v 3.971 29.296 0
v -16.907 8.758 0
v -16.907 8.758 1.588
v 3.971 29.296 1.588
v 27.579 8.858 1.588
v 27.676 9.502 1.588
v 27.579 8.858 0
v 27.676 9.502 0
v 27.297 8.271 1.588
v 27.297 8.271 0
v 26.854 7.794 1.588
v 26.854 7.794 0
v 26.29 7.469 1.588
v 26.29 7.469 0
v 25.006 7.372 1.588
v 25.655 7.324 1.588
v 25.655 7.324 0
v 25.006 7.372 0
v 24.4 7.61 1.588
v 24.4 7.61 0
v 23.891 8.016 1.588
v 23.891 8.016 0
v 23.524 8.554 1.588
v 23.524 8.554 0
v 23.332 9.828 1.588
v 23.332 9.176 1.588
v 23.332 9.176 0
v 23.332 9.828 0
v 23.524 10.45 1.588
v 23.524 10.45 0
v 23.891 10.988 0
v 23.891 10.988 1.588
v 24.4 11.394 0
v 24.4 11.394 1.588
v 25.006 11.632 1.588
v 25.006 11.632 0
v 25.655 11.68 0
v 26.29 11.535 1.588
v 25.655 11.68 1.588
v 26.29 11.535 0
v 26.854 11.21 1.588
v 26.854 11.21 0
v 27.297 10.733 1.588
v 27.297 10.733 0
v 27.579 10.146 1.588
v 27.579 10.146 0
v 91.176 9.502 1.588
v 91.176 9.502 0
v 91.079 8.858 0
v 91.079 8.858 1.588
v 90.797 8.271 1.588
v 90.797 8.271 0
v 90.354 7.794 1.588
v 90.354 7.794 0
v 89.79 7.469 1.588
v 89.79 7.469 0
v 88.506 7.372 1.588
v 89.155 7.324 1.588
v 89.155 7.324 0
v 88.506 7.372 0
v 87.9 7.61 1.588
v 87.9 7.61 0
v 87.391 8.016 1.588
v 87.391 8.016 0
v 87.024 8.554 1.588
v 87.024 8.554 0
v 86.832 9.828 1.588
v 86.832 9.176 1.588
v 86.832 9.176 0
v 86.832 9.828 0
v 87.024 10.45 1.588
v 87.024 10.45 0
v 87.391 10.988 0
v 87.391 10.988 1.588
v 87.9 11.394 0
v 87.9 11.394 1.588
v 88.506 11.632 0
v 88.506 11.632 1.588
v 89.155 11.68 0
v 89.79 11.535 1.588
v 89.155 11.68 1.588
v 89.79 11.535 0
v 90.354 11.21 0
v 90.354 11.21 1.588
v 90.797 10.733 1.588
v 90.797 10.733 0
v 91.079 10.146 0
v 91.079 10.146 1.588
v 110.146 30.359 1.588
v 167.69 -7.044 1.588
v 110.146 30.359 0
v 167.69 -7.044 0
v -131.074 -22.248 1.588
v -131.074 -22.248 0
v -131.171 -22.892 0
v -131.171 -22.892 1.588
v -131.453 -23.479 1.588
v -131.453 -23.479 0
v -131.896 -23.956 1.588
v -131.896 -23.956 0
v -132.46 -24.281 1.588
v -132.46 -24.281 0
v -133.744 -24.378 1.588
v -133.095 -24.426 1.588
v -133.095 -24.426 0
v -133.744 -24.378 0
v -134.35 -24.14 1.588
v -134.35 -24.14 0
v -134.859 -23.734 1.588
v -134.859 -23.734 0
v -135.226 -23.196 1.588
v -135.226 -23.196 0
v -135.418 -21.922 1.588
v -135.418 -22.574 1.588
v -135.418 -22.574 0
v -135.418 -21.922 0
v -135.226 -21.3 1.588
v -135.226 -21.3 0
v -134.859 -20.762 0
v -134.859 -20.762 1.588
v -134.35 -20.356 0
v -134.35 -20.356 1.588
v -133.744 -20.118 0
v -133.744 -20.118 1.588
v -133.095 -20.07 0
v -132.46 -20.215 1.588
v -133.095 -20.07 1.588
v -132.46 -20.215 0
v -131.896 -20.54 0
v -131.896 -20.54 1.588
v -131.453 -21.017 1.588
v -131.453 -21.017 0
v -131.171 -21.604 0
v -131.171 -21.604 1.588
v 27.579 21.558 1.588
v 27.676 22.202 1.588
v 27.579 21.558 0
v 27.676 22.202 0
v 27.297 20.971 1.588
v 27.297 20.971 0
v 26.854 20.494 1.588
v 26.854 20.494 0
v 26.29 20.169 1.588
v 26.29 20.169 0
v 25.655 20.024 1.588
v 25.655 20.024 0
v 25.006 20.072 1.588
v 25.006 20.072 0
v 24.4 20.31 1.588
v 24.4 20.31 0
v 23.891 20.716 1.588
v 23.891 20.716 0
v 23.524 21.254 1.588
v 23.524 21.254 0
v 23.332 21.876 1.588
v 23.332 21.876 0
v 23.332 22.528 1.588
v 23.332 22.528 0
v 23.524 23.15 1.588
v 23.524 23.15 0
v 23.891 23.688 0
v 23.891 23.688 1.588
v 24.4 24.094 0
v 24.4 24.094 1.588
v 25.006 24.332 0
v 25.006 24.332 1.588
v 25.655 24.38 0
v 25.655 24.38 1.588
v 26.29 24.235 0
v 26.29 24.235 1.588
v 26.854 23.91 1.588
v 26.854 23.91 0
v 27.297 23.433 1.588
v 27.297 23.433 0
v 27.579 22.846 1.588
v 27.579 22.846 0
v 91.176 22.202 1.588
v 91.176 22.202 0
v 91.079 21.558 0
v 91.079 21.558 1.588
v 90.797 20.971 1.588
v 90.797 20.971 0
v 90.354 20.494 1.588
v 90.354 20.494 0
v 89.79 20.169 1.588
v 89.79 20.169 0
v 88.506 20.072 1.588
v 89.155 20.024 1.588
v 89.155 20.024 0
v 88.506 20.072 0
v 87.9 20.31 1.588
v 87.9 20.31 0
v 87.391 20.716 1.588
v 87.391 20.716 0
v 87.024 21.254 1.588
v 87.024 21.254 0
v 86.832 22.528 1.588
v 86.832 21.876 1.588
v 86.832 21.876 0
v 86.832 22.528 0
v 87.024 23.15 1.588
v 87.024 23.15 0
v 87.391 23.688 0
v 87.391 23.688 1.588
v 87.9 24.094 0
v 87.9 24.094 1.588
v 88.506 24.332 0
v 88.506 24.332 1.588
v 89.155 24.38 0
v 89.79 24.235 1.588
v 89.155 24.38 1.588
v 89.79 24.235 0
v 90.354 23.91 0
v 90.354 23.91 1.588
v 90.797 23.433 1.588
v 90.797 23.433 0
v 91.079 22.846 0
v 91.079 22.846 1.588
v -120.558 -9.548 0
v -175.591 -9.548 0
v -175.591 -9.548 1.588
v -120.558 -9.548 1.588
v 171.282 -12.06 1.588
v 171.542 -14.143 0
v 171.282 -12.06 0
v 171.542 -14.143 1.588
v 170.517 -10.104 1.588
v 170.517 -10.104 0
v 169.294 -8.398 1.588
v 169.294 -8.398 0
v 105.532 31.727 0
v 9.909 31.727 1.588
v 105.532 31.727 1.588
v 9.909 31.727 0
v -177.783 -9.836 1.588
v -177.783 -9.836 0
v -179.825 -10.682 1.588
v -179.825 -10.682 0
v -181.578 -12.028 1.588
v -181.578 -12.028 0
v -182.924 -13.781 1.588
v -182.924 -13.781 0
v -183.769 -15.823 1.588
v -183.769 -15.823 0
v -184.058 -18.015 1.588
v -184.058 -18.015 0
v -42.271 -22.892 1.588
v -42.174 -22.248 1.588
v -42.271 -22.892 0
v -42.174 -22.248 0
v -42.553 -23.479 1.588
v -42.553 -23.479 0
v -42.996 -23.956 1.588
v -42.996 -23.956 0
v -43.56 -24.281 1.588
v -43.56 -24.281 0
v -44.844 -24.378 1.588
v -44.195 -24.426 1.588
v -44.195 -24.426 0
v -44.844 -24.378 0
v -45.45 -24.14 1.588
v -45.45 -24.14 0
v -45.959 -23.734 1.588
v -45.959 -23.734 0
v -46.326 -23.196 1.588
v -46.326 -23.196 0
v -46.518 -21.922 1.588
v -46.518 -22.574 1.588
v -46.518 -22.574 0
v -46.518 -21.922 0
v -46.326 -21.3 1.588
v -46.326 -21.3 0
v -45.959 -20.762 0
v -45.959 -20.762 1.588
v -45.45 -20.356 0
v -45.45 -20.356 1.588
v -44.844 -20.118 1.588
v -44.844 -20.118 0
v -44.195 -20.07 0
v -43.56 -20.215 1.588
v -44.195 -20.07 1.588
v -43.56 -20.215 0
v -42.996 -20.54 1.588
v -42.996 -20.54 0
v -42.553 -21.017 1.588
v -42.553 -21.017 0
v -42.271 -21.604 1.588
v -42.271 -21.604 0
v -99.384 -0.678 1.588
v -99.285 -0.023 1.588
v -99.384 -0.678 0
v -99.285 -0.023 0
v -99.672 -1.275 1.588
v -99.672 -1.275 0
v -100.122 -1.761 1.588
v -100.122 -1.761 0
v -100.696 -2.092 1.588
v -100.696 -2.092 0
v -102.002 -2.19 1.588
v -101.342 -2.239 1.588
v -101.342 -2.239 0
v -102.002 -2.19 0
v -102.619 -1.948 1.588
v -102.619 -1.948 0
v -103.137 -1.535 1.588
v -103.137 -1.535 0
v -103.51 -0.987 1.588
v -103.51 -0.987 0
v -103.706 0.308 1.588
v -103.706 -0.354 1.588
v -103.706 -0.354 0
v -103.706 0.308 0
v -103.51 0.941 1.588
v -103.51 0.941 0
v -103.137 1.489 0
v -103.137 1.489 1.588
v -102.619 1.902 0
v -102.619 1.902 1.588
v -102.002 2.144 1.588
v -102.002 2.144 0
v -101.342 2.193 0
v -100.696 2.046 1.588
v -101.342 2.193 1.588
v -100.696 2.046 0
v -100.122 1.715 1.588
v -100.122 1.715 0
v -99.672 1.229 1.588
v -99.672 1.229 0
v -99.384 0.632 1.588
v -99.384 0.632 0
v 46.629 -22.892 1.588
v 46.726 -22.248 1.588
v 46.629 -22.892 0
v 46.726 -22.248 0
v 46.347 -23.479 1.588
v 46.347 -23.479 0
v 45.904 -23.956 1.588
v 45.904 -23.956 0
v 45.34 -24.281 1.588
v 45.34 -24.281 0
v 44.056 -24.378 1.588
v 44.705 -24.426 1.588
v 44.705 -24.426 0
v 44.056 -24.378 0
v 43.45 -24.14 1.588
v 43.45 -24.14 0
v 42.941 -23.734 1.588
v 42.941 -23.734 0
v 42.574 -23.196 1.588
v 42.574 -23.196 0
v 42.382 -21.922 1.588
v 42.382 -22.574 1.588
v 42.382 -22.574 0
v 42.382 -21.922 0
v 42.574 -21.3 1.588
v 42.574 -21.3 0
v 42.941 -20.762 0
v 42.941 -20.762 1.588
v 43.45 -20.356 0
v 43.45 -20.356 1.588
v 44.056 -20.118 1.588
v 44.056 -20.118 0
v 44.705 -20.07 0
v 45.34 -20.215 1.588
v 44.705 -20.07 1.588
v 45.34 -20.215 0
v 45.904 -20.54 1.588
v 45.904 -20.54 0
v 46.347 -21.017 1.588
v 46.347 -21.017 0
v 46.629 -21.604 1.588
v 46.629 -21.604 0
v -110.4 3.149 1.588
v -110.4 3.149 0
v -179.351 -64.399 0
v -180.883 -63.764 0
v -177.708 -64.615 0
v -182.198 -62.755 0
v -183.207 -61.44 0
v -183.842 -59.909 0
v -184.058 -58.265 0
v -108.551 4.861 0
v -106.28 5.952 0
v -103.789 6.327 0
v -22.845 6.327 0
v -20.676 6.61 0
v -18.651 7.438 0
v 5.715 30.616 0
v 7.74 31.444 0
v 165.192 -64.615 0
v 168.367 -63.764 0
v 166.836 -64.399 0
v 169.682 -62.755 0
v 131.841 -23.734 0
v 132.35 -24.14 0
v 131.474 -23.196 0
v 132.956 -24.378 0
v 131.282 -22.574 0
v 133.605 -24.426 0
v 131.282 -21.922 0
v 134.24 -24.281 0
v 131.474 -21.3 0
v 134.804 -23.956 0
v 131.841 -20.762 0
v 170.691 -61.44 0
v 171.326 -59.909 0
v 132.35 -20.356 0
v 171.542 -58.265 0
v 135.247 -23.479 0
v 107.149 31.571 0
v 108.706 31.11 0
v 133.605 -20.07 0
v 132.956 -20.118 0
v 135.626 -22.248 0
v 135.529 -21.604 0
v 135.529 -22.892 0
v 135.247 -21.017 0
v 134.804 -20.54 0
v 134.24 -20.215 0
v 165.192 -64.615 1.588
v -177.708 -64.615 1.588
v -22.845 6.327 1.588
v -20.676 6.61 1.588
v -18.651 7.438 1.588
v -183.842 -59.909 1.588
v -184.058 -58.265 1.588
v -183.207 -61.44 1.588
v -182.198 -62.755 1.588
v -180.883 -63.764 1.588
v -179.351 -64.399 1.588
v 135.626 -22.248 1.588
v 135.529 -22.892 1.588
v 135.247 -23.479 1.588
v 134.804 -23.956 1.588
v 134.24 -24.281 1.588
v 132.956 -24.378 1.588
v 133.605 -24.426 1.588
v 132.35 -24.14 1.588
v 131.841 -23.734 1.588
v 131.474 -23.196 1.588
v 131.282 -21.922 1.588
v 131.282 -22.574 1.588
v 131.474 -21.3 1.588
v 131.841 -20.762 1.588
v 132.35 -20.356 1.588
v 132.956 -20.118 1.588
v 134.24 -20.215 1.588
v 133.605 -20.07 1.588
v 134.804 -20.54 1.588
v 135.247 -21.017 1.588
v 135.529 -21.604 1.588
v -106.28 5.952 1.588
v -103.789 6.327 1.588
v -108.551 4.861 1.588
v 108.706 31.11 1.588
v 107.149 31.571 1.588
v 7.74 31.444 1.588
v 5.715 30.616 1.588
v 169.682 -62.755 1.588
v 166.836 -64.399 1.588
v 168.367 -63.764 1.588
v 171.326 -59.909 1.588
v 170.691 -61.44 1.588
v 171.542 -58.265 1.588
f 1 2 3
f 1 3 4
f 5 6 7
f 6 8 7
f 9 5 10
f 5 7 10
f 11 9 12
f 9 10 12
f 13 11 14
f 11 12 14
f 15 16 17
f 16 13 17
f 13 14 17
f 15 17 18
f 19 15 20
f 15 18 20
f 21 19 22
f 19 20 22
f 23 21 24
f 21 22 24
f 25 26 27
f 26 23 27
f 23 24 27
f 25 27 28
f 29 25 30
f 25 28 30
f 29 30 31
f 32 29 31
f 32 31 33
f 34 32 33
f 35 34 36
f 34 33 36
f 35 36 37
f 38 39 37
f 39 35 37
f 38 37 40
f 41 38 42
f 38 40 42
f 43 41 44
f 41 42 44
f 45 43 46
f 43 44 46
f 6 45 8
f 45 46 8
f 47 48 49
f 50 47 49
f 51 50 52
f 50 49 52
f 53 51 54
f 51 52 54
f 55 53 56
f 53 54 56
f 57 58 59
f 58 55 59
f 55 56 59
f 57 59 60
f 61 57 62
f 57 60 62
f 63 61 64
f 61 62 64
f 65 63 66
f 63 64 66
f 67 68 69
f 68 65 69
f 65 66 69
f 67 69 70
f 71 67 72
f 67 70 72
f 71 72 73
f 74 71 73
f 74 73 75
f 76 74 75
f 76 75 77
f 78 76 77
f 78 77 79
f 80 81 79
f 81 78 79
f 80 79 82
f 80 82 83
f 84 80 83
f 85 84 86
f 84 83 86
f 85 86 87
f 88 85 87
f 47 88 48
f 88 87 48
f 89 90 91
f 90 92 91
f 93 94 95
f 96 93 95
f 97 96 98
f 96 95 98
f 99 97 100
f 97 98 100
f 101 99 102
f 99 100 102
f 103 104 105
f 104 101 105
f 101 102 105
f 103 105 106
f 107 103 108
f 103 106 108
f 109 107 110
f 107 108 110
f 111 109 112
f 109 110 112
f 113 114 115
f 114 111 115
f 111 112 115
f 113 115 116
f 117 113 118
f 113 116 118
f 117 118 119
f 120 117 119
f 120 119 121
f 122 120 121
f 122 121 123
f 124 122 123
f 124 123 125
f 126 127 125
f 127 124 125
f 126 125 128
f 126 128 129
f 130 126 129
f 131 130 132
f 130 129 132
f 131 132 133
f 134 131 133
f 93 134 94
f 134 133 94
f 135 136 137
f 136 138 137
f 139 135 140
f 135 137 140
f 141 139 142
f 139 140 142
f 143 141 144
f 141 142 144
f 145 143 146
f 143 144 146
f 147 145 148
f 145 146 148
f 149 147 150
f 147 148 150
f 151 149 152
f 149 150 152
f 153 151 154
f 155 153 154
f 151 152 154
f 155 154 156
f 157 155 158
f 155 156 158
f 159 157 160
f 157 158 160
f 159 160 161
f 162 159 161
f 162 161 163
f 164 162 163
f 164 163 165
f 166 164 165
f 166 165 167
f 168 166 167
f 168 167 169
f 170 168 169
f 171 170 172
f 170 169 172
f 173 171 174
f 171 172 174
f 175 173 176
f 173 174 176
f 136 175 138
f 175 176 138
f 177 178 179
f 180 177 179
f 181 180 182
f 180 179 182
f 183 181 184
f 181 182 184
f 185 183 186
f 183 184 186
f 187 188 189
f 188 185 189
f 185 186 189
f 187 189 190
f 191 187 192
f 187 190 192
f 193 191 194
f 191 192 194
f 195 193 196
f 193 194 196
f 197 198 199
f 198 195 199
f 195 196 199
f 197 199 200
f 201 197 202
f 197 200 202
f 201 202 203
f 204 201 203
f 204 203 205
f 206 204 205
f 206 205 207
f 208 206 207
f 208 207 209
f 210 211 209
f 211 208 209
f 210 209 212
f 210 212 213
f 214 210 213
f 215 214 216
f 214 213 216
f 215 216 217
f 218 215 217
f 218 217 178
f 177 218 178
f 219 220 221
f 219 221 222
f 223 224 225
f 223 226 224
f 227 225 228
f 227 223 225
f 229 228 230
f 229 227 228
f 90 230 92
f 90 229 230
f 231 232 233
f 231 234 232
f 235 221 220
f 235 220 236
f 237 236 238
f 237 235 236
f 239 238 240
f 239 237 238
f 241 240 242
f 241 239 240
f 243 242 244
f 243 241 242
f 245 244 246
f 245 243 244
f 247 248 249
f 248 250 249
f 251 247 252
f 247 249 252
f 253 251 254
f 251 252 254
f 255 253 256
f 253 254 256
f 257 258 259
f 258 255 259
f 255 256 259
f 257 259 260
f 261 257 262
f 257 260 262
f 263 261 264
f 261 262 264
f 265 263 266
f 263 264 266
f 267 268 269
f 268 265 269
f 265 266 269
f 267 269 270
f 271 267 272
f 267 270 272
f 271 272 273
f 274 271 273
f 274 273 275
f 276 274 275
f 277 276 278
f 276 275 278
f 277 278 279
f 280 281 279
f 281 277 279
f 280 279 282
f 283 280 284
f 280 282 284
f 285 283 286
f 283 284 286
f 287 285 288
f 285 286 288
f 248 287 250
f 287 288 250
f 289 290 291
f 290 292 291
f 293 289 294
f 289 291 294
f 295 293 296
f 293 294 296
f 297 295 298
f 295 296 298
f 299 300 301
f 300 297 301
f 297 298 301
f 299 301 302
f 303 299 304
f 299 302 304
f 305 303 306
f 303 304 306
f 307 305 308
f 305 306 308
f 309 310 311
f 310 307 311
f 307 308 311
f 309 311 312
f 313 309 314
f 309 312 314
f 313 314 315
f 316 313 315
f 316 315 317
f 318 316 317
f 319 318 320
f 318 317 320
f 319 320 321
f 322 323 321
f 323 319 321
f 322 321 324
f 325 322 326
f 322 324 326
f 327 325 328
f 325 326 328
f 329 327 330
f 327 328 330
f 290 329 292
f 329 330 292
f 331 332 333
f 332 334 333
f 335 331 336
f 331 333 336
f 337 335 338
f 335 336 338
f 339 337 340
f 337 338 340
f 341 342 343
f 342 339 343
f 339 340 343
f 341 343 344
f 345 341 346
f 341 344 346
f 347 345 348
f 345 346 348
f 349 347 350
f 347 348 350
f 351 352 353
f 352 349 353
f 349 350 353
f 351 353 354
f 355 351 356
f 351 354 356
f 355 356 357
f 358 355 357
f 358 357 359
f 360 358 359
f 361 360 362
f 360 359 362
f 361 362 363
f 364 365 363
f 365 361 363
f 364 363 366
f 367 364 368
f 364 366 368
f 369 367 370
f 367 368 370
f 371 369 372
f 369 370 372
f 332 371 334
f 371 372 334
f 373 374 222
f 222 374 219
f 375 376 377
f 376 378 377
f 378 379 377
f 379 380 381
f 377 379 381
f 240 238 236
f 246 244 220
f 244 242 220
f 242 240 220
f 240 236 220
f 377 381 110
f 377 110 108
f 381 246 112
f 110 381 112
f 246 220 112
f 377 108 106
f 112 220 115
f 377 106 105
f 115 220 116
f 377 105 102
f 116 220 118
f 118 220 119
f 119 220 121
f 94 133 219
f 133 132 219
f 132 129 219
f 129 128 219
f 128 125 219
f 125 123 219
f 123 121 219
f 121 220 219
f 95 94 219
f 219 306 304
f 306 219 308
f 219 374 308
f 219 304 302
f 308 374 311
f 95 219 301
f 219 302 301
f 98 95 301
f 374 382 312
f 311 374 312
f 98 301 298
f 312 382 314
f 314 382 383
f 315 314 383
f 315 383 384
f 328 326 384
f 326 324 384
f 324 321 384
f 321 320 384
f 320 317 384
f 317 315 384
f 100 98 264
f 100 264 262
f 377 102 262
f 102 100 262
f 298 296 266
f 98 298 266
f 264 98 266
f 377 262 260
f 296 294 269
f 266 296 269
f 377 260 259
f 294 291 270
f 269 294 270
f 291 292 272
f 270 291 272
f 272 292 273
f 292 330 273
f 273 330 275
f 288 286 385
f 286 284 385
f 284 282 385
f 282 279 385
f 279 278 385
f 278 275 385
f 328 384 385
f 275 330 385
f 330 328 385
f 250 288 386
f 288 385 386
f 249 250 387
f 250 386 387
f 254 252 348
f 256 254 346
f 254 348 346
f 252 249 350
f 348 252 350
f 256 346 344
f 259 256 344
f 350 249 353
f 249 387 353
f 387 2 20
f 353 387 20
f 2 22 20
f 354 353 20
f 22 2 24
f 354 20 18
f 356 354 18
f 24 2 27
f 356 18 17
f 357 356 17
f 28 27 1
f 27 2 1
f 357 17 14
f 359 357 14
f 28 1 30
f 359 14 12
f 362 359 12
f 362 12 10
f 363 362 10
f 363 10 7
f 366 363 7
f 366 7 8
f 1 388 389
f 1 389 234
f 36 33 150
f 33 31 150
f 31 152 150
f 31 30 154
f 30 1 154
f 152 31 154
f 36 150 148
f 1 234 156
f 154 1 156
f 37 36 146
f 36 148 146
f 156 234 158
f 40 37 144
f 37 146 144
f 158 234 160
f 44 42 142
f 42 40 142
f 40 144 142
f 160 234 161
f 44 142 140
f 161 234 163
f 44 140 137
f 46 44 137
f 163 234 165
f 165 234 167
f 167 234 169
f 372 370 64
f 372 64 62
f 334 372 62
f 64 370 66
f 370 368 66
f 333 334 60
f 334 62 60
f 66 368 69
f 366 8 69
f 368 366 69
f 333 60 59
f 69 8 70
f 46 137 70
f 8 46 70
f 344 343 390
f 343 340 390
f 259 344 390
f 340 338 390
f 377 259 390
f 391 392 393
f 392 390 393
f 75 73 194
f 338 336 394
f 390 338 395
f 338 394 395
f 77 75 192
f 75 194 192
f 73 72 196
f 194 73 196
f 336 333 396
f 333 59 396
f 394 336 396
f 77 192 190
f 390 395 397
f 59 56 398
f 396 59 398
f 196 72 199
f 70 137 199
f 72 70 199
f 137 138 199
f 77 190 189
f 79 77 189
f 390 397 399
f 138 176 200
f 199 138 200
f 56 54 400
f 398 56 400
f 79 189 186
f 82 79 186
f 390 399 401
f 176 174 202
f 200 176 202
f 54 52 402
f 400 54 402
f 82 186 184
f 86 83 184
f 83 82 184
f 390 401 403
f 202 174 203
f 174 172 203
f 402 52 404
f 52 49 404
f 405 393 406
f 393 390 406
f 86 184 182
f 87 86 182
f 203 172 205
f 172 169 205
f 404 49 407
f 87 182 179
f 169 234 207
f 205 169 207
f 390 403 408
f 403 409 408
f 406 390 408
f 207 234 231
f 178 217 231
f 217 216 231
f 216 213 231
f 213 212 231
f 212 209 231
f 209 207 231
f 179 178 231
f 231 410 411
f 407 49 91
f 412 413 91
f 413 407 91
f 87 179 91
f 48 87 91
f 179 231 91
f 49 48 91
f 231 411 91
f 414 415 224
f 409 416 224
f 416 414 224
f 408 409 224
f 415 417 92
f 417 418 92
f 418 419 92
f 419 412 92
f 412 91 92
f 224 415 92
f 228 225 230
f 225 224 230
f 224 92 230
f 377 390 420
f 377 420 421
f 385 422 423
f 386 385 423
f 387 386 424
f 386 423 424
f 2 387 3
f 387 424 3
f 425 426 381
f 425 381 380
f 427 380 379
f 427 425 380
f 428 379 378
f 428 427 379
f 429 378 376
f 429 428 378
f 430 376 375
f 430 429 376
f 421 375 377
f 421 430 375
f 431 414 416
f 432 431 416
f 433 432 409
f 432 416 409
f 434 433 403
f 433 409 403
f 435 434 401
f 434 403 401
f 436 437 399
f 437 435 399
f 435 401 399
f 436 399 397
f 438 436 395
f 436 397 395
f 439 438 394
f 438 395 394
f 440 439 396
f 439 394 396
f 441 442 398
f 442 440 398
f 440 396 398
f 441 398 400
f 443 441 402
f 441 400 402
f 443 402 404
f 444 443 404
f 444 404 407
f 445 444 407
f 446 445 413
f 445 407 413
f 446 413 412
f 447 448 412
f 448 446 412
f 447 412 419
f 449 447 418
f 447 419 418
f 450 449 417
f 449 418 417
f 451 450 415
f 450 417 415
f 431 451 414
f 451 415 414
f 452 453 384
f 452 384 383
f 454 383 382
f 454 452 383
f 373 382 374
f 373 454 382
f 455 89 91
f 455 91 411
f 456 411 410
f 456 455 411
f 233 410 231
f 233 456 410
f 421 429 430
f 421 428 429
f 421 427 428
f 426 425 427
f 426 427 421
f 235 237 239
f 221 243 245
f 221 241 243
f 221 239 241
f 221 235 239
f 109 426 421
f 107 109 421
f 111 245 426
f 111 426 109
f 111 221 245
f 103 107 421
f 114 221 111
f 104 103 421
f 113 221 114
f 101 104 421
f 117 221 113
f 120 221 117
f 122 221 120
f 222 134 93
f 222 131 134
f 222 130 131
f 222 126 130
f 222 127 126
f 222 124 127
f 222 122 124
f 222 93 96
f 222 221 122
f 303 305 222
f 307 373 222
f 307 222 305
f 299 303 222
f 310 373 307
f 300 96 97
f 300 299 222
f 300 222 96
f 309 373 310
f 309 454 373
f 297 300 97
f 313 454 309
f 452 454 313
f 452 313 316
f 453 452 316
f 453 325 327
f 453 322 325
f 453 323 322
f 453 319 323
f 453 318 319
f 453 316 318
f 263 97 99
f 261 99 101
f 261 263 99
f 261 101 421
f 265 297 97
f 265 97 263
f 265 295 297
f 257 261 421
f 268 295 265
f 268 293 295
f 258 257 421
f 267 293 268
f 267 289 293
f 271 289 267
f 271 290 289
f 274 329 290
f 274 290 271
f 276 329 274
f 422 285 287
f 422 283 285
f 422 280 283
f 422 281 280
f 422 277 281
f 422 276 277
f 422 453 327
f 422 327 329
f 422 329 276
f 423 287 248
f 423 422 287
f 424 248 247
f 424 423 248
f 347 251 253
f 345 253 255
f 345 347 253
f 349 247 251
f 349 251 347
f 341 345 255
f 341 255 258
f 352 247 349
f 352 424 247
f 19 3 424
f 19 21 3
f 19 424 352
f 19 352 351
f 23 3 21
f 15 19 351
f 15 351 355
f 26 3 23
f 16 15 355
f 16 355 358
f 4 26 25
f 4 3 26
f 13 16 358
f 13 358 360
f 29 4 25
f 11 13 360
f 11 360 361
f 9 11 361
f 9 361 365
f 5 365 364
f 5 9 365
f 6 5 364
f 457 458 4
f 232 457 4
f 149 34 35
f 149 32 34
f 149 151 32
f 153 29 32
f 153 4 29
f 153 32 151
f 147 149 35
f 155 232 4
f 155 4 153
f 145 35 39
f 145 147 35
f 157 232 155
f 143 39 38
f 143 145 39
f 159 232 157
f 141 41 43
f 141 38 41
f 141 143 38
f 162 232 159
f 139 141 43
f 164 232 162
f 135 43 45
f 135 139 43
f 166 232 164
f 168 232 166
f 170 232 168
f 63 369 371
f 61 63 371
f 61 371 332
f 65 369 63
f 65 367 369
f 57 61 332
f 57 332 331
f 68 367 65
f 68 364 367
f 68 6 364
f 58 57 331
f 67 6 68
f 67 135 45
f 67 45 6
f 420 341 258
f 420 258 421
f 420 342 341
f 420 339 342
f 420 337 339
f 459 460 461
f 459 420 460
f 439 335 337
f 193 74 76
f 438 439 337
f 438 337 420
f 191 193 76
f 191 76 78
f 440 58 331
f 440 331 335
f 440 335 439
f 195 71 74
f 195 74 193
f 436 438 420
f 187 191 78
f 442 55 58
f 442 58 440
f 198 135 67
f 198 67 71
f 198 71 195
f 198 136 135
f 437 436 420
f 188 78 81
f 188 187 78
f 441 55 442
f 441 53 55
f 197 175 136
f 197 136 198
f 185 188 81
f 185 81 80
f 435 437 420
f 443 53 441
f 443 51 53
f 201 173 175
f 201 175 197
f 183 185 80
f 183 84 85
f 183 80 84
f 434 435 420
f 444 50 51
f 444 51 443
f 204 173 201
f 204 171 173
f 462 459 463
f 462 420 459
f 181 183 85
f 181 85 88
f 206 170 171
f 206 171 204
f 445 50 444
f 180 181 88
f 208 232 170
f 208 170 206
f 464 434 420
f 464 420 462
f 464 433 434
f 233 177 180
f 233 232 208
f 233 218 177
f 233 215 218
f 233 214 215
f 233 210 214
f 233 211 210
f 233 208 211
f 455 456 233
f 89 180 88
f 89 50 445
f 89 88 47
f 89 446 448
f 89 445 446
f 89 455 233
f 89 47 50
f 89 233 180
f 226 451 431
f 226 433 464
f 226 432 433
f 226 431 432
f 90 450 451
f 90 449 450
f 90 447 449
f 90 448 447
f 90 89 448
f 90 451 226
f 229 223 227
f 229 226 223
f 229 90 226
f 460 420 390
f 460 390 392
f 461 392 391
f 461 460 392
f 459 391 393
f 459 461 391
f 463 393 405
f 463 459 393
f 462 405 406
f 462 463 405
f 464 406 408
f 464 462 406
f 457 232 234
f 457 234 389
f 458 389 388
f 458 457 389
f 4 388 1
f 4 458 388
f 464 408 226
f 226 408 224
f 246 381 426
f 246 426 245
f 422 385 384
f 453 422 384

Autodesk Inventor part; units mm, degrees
ref_plane "YZ Plane" through (0, 0, 0) normal (1, 0, 0) x (0, 1, 0)
ref_plane "XZ Plane" through (0, 0, 0) normal (0, 1, 0) x (-1, 0, 0)
ref_plane "XY Plane" through (0, 0, 0) normal (0, 0, 1) x (1, 0, 0)
sketch "Sketch1" plane through (0, 0, 0) normal (0, 0, 1) x (1, 0, 0)
  circle A0 centre (-133.2579, -22.248) radius 2.1844
  circle A1 centre (-101.5079, -0.023) radius 2.2225
  circle A2 centre (-44.3579, -22.248) radius 2.1844
  circle A3 centre (25.4921, 9.502) radius 2.1844
  circle A4 centre (25.4921, 22.202) radius 2.1844
  circle A5 centre (88.9921, 9.502) radius 2.1844
  circle A6 centre (88.9921, 22.202) radius 2.1844
  circle A7 centre (44.5421, -22.248) radius 2.1844
  circle A8 centre (133.4421, -22.248) radius 2.1844
  line L0 (133.4421, -22.248) -> (171.5421, -22.248)
  line L1 (171.5421, -22.248) -> (171.5421, -60.348)
  line L2 (171.5421, -60.348) -> (-184.0579, -60.348)
  line L3 (-184.0579, -60.348) -> (-184.0579, -9.548)
  line L4 (-184.0579, -9.548) -> (-114.2079, -9.548)
  line L5 (-114.2079, -9.548) -> (-114.2079, 6.327)
  line L6 (-19.3781, 6.327) -> (-19.3781, 31.727)
  line L7 (-19.3781, 31.727) -> (6.4421, 31.727)
  line L8 (-19.3781, 6.327) -> (6.4421, 31.727)
  line L9 (6.4421, 31.727) -> (108.0421, 31.727)
  line L10 (108.0421, 31.727) -> (133.1583, 6.1953)
  line L11 (171.5421, -22.248) -> (108.0421, 31.727)
  line L12 (88.9921, 22.202) -> (108.0421, 22.202)
  line L13 (108.0421, 22.202) -> (108.0421, 31.727)
  line L14 (25.4921, 22.202) -> (6.4421, 22.202)
  line L15 (6.4421, 22.202) -> (6.4421, 31.727)
  line L16 (-19.3781, 6.327) -> (-101.5079, 6.327)
  line L17 (-101.5079, 6.327) -> (-114.2079, -9.548)
  line L18 (171.5421, -22.248) -> (171.5421, -9.548)
  line L19 (171.5421, -9.548) -> (108.0421, 31.727)
  line L20 (-114.2079, -9.548) -> (-120.5579, -9.548)
  line L21 (-101.5079, 6.327) -> (-107.8579, 6.327)
  line L22 (-107.8579, 6.327) -> (-120.5579, -9.548)
  line L23 (171.5421, -60.348) -> (171.5421, -64.6152)
  line L24 (171.5421, -64.6152) -> (-184.0579, -64.6152)
  line L25 (-184.0579, -64.6152) -> (-184.0579, -60.348)
  point P0 (0, 0)
  dimension "d0" = 38.1
  dimension "d1" = 38.1
  dimension "d2" = 355.6
  dimension "d3" = 50.8
  dimension "d4" = 69.85
  dimension "d5" = 15.875
  dimension "d7" = 25.4
  dimension "d10" = 19.05
  dimension "d11" = 19.05
  dimension "d14" = 12.7
  dimension "d17" = 6.35
  dimension "d18" = 6.35
  dimension "d21" = 4.2672
extrude "Extrusion2" add sketch "Sketch1" along normal blind 1.5875 contours L1 L2 L3 L4 L17 L16 L8 L9 L11 | L23 L24 L25 L2 | L22 L5 L4 | L17 L5 L22 L21
extrude "Extrusion3" add sketch "Sketch1" along normal blind 1.5875 contours L11 L19 L18
fillet "Fillet1" radius 8.4667 3 edges at (-107.8579, 6.327, 0.7937) (6.4421, 31.727, 0.7937) (-19.3781, 6.327, 0.7937)
fillet "Fillet2" radius 8.4667 3 edges at (108.0421, 31.727, 0.7937) (171.5421, -9.548, 0.7937) (-184.0579, -9.548, 0.7937)
fillet "Fillet3" radius 6.35 2 edges at (171.5421, -64.6152, 0.7937) (-184.0579, -64.6152, 0.7937)
properties part number "Skirt"
